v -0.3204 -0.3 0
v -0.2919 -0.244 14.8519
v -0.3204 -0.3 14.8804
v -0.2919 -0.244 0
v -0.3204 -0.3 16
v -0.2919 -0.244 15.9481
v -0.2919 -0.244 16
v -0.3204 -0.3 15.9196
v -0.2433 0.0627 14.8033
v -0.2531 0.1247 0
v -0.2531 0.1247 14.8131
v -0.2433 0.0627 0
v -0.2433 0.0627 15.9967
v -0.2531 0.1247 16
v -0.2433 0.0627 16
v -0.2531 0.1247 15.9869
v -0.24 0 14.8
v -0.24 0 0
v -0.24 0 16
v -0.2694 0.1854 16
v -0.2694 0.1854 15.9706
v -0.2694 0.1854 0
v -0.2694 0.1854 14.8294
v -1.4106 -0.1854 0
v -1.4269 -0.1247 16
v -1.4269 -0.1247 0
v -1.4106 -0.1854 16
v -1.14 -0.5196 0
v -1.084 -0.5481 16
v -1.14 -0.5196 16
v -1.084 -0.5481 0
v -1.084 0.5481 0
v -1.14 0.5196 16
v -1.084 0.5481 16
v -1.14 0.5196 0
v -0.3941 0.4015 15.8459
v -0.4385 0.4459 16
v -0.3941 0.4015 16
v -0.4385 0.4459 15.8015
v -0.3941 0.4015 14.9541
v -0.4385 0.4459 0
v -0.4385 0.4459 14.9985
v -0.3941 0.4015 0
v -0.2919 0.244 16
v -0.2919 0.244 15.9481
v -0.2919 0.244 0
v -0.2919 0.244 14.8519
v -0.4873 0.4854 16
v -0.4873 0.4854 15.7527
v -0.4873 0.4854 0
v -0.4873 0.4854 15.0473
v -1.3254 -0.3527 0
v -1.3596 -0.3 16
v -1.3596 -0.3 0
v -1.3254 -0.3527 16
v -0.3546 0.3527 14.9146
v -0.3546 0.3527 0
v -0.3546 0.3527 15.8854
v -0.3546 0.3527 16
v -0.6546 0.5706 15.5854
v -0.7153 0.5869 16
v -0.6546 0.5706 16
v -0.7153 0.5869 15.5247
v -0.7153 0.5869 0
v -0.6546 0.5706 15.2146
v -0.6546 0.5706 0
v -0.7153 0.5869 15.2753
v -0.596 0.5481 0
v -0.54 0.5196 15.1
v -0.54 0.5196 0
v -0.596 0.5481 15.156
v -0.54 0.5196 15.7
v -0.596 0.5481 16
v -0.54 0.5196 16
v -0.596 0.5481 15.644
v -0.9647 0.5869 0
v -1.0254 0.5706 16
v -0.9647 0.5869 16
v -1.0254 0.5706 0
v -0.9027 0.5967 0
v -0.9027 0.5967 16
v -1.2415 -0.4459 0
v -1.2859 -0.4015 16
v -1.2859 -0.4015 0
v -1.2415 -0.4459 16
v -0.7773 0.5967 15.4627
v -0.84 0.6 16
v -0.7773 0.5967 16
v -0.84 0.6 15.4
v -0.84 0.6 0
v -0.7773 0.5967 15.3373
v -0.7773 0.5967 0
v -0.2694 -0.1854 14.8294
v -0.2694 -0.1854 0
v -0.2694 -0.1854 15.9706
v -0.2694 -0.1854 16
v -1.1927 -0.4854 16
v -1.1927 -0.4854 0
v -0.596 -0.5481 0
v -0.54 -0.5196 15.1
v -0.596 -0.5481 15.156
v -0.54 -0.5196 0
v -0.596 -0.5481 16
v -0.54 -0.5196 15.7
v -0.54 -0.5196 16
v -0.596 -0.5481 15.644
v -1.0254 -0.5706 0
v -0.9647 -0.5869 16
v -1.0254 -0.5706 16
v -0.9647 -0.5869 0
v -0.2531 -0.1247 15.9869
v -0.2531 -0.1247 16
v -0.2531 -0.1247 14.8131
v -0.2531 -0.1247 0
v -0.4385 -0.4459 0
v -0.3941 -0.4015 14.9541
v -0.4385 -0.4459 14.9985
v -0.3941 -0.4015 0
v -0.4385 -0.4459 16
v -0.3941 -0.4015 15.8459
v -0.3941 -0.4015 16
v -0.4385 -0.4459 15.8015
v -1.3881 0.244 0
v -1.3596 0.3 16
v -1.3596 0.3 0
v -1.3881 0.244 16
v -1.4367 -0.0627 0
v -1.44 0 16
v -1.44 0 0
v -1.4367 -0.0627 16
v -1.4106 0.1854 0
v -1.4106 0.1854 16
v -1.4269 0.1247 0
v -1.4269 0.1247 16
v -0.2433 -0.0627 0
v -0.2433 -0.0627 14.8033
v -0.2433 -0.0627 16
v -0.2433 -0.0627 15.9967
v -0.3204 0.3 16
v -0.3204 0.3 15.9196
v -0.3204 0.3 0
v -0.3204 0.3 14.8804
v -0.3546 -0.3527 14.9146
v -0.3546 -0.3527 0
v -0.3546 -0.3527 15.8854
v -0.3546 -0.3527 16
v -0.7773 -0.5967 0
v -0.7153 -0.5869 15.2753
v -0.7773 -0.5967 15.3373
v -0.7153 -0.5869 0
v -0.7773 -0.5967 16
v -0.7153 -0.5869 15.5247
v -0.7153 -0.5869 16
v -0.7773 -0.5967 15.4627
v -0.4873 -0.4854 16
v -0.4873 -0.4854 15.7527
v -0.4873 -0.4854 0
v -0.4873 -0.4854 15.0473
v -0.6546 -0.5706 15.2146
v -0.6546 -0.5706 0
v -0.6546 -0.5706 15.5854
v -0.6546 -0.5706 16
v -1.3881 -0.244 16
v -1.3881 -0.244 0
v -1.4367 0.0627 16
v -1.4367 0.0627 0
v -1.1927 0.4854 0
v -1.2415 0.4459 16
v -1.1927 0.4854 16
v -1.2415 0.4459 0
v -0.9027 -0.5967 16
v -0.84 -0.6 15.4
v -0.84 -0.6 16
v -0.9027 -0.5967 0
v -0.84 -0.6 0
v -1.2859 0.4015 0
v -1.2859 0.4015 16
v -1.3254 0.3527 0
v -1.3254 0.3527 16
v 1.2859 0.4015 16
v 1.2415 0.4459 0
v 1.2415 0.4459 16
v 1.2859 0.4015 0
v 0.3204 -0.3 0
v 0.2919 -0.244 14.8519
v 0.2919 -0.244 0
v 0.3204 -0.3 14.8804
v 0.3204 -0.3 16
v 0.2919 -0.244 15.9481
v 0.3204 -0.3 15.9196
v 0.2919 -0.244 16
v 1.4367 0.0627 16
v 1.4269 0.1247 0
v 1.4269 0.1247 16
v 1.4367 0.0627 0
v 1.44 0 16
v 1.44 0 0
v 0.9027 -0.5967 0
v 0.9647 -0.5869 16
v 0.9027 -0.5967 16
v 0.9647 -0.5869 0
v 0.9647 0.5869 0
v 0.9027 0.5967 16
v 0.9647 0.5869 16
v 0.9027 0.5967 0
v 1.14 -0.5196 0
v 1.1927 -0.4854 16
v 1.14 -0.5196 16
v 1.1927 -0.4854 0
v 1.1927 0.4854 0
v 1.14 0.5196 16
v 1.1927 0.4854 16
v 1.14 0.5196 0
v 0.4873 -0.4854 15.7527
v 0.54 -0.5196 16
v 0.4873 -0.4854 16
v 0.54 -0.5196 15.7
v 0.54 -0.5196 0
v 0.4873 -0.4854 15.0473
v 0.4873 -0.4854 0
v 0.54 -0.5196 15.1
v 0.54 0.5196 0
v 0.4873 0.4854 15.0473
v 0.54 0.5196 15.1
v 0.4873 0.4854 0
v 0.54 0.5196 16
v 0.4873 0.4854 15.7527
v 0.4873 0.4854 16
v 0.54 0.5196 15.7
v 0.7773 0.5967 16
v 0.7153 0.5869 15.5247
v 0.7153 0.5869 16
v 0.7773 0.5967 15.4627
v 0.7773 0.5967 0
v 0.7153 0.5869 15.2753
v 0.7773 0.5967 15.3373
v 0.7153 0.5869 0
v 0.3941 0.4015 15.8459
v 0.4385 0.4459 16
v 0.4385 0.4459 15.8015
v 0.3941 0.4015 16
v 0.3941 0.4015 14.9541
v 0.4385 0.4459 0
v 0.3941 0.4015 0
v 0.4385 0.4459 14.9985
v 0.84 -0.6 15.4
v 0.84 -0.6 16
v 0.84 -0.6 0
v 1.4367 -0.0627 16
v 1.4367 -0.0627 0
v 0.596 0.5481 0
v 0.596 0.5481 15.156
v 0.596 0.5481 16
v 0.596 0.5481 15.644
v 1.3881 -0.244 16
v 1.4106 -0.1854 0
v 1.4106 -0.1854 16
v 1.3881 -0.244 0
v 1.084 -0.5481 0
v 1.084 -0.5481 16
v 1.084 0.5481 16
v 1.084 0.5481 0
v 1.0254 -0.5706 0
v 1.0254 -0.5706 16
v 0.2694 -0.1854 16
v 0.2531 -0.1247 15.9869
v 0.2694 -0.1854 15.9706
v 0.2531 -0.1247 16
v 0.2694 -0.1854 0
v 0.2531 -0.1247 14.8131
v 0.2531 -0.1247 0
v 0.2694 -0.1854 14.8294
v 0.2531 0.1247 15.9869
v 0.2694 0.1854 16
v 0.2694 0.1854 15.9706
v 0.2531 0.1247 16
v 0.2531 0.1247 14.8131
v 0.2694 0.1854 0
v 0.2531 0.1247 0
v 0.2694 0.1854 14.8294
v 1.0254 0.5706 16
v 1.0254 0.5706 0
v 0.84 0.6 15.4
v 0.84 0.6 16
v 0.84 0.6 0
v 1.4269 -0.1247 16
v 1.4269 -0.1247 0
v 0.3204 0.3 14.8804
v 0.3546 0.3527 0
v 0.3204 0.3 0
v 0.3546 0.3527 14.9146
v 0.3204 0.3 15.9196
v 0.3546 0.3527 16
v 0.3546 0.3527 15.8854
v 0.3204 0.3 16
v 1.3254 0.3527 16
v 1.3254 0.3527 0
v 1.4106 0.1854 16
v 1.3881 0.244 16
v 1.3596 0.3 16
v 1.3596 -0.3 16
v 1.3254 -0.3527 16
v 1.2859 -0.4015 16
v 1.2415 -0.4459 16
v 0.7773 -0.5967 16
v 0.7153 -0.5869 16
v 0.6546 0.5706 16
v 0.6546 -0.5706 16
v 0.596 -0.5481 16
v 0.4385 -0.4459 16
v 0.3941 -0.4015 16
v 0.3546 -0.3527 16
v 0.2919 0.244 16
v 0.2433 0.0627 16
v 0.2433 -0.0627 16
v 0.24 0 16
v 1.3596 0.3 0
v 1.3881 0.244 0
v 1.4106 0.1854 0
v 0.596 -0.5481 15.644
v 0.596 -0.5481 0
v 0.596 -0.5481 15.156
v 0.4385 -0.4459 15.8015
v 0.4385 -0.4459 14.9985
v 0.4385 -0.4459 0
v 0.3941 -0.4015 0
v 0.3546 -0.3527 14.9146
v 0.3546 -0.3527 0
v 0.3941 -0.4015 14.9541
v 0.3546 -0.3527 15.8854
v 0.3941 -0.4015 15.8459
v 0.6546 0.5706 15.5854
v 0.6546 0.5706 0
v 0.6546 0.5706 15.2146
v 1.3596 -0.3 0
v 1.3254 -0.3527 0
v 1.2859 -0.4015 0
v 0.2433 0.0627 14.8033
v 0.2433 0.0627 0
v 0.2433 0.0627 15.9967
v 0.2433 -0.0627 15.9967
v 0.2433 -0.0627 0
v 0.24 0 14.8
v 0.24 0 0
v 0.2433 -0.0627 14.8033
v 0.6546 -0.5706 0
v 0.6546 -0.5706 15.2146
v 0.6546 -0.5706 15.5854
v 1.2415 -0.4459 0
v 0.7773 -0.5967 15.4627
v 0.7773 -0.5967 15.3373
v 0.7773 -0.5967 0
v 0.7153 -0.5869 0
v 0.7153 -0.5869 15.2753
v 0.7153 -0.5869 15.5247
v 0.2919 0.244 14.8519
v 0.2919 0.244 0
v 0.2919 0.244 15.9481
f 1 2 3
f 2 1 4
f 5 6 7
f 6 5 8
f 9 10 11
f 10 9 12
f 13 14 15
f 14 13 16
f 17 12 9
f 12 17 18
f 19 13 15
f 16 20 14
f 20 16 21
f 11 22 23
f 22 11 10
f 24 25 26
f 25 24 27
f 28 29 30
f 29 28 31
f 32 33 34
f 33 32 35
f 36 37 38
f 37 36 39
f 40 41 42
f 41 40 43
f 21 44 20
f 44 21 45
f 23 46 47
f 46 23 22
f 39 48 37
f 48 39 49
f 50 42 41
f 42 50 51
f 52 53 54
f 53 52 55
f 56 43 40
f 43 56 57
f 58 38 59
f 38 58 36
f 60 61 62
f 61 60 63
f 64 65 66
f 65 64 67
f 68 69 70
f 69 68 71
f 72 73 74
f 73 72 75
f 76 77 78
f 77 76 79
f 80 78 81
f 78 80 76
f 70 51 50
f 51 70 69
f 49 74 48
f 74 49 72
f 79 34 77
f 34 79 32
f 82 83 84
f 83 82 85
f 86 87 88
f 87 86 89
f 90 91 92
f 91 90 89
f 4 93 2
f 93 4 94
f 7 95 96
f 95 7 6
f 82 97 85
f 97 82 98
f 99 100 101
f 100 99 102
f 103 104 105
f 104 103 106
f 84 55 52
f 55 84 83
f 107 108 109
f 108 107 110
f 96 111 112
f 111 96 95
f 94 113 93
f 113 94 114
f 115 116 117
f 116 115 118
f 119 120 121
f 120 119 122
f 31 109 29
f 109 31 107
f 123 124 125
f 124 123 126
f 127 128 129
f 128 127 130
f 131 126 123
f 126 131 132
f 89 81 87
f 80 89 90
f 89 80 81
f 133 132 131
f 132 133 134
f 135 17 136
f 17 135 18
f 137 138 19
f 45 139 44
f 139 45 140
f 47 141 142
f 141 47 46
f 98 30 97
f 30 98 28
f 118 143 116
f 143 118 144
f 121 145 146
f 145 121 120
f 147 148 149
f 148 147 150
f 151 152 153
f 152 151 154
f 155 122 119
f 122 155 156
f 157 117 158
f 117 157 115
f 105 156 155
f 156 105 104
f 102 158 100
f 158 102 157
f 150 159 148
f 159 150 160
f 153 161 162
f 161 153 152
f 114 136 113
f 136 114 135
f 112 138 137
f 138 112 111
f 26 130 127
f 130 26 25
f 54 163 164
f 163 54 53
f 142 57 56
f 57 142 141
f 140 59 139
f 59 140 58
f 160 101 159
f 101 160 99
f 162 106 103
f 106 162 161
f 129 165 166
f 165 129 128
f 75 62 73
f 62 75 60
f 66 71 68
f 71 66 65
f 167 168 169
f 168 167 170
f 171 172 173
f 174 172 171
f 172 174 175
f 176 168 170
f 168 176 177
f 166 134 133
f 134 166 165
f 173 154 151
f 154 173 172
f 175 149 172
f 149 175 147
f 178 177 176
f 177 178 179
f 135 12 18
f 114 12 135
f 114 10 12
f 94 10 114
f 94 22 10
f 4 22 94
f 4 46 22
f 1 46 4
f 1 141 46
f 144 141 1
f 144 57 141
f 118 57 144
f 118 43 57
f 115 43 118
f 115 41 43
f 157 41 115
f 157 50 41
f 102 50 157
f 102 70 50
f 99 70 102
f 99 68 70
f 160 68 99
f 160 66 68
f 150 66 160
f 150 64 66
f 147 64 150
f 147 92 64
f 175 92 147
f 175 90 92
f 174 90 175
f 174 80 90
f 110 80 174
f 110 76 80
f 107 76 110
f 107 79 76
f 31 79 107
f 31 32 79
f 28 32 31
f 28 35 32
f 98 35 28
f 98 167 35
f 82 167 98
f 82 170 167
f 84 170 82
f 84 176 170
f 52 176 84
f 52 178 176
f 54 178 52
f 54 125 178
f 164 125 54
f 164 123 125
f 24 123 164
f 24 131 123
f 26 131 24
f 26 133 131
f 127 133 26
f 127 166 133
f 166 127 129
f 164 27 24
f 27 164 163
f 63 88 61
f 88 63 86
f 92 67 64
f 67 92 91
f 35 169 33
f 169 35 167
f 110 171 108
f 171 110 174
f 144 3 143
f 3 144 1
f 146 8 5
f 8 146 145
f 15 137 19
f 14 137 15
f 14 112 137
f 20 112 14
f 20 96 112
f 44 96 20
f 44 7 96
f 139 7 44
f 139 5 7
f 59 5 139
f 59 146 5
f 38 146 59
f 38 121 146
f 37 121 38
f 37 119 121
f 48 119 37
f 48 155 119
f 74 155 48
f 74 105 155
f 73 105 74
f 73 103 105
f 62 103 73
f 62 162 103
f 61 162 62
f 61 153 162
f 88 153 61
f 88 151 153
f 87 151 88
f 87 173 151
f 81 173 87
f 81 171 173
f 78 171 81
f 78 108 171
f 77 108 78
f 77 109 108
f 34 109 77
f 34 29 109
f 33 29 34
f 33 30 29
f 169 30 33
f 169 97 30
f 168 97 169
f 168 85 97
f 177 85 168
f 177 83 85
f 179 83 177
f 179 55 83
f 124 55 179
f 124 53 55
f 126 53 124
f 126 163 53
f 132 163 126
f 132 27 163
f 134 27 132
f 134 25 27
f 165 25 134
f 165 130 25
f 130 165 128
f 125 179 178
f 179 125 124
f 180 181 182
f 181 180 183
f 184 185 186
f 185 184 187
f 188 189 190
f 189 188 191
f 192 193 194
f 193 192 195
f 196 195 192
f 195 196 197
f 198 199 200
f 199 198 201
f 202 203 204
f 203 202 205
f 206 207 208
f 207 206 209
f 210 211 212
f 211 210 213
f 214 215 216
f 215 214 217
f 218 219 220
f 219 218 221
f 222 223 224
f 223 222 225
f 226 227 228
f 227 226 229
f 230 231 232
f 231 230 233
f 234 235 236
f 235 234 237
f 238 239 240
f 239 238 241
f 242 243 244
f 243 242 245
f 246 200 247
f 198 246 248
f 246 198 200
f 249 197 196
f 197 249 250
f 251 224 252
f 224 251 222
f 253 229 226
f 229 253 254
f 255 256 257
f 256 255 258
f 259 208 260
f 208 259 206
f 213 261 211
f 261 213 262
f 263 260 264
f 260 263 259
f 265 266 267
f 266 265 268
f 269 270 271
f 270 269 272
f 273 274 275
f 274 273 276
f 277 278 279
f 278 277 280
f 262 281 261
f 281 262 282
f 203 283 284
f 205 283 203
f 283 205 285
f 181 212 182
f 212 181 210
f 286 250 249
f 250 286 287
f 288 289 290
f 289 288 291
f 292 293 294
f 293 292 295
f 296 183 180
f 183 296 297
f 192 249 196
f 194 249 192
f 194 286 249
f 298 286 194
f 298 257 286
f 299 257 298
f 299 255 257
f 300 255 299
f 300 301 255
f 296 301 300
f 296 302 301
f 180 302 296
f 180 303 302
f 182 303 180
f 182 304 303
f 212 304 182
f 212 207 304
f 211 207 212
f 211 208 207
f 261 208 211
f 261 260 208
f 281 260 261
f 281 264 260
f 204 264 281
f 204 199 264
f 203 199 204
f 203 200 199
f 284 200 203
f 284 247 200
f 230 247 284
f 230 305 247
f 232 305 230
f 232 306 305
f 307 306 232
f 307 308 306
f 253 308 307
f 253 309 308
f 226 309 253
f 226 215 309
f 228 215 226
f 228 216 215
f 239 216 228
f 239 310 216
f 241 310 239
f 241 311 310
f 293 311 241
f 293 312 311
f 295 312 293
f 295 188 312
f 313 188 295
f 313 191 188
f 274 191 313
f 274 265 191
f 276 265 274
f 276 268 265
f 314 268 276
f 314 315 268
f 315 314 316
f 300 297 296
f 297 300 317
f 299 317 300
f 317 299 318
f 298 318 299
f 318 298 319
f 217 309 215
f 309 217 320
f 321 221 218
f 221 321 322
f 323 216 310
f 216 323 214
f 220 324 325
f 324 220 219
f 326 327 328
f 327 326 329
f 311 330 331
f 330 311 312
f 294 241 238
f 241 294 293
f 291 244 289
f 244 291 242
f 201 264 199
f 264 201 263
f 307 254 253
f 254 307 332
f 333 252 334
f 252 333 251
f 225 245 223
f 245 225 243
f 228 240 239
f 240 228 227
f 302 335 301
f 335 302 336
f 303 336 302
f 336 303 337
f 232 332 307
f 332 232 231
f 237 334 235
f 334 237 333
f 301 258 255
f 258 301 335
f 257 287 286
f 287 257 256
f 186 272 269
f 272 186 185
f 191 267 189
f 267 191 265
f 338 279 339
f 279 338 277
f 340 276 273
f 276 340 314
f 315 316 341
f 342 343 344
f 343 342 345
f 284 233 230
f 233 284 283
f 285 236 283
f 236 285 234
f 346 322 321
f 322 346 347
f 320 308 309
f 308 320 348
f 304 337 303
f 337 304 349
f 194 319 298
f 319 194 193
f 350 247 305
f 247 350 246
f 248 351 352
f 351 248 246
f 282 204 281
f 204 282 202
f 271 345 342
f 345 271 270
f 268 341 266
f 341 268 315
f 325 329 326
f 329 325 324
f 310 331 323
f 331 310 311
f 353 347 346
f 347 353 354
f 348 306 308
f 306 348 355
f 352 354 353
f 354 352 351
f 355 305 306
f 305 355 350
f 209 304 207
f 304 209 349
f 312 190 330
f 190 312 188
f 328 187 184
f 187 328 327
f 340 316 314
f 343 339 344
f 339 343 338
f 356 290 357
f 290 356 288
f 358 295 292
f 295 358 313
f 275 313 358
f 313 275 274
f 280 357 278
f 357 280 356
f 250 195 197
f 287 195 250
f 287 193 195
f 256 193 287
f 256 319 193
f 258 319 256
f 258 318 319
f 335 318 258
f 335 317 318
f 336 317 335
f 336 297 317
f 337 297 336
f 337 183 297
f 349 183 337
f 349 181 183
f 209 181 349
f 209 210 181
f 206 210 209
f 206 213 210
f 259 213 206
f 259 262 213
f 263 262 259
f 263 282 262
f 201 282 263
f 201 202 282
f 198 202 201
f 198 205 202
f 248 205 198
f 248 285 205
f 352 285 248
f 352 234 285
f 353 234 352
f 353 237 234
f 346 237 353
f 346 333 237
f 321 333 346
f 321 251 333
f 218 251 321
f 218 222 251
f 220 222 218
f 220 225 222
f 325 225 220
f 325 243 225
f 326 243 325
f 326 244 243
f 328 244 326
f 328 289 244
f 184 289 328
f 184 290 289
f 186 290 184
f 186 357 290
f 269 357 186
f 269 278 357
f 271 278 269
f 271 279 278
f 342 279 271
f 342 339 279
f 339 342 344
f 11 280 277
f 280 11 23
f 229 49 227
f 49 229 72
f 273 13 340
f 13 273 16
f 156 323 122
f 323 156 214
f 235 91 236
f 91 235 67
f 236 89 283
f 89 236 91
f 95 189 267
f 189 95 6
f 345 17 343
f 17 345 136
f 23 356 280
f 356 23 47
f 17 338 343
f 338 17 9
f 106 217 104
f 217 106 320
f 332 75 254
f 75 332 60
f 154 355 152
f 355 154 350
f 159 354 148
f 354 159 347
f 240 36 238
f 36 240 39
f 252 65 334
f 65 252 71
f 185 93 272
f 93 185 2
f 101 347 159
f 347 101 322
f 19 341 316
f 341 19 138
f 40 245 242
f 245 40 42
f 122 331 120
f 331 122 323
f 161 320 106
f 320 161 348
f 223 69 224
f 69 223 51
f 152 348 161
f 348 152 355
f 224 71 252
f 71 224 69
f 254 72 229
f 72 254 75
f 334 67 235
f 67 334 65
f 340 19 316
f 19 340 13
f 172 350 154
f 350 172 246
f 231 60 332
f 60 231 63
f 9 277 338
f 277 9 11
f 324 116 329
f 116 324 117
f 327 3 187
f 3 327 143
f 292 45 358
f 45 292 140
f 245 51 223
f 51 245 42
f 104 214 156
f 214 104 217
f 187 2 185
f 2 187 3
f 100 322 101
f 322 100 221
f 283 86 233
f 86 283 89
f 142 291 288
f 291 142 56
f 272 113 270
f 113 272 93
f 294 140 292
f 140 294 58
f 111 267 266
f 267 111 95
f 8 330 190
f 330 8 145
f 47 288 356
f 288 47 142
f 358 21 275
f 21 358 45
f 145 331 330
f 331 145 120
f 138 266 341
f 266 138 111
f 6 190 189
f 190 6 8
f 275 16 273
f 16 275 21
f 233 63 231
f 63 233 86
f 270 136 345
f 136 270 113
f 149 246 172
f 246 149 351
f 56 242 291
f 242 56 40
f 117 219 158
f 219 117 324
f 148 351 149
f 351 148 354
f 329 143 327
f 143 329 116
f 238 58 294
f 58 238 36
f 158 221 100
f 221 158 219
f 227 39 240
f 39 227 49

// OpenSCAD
// Two-prong cotter pin.
$fn = 60;
eps = 0.02;
wire_d = 1.2;
length = 16;
prong_gap = wire_d*1.4;
union() {
    translate([-prong_gap/2,0,0]) cylinder(d=wire_d,h=length);
    translate([prong_gap/2,0,0]) cylinder(d=wire_d,h=length);
    translate([-prong_gap/2,0,length-wire_d/2]) rotate([0,90,0]) cylinder(d=wire_d,h=prong_gap);
}
